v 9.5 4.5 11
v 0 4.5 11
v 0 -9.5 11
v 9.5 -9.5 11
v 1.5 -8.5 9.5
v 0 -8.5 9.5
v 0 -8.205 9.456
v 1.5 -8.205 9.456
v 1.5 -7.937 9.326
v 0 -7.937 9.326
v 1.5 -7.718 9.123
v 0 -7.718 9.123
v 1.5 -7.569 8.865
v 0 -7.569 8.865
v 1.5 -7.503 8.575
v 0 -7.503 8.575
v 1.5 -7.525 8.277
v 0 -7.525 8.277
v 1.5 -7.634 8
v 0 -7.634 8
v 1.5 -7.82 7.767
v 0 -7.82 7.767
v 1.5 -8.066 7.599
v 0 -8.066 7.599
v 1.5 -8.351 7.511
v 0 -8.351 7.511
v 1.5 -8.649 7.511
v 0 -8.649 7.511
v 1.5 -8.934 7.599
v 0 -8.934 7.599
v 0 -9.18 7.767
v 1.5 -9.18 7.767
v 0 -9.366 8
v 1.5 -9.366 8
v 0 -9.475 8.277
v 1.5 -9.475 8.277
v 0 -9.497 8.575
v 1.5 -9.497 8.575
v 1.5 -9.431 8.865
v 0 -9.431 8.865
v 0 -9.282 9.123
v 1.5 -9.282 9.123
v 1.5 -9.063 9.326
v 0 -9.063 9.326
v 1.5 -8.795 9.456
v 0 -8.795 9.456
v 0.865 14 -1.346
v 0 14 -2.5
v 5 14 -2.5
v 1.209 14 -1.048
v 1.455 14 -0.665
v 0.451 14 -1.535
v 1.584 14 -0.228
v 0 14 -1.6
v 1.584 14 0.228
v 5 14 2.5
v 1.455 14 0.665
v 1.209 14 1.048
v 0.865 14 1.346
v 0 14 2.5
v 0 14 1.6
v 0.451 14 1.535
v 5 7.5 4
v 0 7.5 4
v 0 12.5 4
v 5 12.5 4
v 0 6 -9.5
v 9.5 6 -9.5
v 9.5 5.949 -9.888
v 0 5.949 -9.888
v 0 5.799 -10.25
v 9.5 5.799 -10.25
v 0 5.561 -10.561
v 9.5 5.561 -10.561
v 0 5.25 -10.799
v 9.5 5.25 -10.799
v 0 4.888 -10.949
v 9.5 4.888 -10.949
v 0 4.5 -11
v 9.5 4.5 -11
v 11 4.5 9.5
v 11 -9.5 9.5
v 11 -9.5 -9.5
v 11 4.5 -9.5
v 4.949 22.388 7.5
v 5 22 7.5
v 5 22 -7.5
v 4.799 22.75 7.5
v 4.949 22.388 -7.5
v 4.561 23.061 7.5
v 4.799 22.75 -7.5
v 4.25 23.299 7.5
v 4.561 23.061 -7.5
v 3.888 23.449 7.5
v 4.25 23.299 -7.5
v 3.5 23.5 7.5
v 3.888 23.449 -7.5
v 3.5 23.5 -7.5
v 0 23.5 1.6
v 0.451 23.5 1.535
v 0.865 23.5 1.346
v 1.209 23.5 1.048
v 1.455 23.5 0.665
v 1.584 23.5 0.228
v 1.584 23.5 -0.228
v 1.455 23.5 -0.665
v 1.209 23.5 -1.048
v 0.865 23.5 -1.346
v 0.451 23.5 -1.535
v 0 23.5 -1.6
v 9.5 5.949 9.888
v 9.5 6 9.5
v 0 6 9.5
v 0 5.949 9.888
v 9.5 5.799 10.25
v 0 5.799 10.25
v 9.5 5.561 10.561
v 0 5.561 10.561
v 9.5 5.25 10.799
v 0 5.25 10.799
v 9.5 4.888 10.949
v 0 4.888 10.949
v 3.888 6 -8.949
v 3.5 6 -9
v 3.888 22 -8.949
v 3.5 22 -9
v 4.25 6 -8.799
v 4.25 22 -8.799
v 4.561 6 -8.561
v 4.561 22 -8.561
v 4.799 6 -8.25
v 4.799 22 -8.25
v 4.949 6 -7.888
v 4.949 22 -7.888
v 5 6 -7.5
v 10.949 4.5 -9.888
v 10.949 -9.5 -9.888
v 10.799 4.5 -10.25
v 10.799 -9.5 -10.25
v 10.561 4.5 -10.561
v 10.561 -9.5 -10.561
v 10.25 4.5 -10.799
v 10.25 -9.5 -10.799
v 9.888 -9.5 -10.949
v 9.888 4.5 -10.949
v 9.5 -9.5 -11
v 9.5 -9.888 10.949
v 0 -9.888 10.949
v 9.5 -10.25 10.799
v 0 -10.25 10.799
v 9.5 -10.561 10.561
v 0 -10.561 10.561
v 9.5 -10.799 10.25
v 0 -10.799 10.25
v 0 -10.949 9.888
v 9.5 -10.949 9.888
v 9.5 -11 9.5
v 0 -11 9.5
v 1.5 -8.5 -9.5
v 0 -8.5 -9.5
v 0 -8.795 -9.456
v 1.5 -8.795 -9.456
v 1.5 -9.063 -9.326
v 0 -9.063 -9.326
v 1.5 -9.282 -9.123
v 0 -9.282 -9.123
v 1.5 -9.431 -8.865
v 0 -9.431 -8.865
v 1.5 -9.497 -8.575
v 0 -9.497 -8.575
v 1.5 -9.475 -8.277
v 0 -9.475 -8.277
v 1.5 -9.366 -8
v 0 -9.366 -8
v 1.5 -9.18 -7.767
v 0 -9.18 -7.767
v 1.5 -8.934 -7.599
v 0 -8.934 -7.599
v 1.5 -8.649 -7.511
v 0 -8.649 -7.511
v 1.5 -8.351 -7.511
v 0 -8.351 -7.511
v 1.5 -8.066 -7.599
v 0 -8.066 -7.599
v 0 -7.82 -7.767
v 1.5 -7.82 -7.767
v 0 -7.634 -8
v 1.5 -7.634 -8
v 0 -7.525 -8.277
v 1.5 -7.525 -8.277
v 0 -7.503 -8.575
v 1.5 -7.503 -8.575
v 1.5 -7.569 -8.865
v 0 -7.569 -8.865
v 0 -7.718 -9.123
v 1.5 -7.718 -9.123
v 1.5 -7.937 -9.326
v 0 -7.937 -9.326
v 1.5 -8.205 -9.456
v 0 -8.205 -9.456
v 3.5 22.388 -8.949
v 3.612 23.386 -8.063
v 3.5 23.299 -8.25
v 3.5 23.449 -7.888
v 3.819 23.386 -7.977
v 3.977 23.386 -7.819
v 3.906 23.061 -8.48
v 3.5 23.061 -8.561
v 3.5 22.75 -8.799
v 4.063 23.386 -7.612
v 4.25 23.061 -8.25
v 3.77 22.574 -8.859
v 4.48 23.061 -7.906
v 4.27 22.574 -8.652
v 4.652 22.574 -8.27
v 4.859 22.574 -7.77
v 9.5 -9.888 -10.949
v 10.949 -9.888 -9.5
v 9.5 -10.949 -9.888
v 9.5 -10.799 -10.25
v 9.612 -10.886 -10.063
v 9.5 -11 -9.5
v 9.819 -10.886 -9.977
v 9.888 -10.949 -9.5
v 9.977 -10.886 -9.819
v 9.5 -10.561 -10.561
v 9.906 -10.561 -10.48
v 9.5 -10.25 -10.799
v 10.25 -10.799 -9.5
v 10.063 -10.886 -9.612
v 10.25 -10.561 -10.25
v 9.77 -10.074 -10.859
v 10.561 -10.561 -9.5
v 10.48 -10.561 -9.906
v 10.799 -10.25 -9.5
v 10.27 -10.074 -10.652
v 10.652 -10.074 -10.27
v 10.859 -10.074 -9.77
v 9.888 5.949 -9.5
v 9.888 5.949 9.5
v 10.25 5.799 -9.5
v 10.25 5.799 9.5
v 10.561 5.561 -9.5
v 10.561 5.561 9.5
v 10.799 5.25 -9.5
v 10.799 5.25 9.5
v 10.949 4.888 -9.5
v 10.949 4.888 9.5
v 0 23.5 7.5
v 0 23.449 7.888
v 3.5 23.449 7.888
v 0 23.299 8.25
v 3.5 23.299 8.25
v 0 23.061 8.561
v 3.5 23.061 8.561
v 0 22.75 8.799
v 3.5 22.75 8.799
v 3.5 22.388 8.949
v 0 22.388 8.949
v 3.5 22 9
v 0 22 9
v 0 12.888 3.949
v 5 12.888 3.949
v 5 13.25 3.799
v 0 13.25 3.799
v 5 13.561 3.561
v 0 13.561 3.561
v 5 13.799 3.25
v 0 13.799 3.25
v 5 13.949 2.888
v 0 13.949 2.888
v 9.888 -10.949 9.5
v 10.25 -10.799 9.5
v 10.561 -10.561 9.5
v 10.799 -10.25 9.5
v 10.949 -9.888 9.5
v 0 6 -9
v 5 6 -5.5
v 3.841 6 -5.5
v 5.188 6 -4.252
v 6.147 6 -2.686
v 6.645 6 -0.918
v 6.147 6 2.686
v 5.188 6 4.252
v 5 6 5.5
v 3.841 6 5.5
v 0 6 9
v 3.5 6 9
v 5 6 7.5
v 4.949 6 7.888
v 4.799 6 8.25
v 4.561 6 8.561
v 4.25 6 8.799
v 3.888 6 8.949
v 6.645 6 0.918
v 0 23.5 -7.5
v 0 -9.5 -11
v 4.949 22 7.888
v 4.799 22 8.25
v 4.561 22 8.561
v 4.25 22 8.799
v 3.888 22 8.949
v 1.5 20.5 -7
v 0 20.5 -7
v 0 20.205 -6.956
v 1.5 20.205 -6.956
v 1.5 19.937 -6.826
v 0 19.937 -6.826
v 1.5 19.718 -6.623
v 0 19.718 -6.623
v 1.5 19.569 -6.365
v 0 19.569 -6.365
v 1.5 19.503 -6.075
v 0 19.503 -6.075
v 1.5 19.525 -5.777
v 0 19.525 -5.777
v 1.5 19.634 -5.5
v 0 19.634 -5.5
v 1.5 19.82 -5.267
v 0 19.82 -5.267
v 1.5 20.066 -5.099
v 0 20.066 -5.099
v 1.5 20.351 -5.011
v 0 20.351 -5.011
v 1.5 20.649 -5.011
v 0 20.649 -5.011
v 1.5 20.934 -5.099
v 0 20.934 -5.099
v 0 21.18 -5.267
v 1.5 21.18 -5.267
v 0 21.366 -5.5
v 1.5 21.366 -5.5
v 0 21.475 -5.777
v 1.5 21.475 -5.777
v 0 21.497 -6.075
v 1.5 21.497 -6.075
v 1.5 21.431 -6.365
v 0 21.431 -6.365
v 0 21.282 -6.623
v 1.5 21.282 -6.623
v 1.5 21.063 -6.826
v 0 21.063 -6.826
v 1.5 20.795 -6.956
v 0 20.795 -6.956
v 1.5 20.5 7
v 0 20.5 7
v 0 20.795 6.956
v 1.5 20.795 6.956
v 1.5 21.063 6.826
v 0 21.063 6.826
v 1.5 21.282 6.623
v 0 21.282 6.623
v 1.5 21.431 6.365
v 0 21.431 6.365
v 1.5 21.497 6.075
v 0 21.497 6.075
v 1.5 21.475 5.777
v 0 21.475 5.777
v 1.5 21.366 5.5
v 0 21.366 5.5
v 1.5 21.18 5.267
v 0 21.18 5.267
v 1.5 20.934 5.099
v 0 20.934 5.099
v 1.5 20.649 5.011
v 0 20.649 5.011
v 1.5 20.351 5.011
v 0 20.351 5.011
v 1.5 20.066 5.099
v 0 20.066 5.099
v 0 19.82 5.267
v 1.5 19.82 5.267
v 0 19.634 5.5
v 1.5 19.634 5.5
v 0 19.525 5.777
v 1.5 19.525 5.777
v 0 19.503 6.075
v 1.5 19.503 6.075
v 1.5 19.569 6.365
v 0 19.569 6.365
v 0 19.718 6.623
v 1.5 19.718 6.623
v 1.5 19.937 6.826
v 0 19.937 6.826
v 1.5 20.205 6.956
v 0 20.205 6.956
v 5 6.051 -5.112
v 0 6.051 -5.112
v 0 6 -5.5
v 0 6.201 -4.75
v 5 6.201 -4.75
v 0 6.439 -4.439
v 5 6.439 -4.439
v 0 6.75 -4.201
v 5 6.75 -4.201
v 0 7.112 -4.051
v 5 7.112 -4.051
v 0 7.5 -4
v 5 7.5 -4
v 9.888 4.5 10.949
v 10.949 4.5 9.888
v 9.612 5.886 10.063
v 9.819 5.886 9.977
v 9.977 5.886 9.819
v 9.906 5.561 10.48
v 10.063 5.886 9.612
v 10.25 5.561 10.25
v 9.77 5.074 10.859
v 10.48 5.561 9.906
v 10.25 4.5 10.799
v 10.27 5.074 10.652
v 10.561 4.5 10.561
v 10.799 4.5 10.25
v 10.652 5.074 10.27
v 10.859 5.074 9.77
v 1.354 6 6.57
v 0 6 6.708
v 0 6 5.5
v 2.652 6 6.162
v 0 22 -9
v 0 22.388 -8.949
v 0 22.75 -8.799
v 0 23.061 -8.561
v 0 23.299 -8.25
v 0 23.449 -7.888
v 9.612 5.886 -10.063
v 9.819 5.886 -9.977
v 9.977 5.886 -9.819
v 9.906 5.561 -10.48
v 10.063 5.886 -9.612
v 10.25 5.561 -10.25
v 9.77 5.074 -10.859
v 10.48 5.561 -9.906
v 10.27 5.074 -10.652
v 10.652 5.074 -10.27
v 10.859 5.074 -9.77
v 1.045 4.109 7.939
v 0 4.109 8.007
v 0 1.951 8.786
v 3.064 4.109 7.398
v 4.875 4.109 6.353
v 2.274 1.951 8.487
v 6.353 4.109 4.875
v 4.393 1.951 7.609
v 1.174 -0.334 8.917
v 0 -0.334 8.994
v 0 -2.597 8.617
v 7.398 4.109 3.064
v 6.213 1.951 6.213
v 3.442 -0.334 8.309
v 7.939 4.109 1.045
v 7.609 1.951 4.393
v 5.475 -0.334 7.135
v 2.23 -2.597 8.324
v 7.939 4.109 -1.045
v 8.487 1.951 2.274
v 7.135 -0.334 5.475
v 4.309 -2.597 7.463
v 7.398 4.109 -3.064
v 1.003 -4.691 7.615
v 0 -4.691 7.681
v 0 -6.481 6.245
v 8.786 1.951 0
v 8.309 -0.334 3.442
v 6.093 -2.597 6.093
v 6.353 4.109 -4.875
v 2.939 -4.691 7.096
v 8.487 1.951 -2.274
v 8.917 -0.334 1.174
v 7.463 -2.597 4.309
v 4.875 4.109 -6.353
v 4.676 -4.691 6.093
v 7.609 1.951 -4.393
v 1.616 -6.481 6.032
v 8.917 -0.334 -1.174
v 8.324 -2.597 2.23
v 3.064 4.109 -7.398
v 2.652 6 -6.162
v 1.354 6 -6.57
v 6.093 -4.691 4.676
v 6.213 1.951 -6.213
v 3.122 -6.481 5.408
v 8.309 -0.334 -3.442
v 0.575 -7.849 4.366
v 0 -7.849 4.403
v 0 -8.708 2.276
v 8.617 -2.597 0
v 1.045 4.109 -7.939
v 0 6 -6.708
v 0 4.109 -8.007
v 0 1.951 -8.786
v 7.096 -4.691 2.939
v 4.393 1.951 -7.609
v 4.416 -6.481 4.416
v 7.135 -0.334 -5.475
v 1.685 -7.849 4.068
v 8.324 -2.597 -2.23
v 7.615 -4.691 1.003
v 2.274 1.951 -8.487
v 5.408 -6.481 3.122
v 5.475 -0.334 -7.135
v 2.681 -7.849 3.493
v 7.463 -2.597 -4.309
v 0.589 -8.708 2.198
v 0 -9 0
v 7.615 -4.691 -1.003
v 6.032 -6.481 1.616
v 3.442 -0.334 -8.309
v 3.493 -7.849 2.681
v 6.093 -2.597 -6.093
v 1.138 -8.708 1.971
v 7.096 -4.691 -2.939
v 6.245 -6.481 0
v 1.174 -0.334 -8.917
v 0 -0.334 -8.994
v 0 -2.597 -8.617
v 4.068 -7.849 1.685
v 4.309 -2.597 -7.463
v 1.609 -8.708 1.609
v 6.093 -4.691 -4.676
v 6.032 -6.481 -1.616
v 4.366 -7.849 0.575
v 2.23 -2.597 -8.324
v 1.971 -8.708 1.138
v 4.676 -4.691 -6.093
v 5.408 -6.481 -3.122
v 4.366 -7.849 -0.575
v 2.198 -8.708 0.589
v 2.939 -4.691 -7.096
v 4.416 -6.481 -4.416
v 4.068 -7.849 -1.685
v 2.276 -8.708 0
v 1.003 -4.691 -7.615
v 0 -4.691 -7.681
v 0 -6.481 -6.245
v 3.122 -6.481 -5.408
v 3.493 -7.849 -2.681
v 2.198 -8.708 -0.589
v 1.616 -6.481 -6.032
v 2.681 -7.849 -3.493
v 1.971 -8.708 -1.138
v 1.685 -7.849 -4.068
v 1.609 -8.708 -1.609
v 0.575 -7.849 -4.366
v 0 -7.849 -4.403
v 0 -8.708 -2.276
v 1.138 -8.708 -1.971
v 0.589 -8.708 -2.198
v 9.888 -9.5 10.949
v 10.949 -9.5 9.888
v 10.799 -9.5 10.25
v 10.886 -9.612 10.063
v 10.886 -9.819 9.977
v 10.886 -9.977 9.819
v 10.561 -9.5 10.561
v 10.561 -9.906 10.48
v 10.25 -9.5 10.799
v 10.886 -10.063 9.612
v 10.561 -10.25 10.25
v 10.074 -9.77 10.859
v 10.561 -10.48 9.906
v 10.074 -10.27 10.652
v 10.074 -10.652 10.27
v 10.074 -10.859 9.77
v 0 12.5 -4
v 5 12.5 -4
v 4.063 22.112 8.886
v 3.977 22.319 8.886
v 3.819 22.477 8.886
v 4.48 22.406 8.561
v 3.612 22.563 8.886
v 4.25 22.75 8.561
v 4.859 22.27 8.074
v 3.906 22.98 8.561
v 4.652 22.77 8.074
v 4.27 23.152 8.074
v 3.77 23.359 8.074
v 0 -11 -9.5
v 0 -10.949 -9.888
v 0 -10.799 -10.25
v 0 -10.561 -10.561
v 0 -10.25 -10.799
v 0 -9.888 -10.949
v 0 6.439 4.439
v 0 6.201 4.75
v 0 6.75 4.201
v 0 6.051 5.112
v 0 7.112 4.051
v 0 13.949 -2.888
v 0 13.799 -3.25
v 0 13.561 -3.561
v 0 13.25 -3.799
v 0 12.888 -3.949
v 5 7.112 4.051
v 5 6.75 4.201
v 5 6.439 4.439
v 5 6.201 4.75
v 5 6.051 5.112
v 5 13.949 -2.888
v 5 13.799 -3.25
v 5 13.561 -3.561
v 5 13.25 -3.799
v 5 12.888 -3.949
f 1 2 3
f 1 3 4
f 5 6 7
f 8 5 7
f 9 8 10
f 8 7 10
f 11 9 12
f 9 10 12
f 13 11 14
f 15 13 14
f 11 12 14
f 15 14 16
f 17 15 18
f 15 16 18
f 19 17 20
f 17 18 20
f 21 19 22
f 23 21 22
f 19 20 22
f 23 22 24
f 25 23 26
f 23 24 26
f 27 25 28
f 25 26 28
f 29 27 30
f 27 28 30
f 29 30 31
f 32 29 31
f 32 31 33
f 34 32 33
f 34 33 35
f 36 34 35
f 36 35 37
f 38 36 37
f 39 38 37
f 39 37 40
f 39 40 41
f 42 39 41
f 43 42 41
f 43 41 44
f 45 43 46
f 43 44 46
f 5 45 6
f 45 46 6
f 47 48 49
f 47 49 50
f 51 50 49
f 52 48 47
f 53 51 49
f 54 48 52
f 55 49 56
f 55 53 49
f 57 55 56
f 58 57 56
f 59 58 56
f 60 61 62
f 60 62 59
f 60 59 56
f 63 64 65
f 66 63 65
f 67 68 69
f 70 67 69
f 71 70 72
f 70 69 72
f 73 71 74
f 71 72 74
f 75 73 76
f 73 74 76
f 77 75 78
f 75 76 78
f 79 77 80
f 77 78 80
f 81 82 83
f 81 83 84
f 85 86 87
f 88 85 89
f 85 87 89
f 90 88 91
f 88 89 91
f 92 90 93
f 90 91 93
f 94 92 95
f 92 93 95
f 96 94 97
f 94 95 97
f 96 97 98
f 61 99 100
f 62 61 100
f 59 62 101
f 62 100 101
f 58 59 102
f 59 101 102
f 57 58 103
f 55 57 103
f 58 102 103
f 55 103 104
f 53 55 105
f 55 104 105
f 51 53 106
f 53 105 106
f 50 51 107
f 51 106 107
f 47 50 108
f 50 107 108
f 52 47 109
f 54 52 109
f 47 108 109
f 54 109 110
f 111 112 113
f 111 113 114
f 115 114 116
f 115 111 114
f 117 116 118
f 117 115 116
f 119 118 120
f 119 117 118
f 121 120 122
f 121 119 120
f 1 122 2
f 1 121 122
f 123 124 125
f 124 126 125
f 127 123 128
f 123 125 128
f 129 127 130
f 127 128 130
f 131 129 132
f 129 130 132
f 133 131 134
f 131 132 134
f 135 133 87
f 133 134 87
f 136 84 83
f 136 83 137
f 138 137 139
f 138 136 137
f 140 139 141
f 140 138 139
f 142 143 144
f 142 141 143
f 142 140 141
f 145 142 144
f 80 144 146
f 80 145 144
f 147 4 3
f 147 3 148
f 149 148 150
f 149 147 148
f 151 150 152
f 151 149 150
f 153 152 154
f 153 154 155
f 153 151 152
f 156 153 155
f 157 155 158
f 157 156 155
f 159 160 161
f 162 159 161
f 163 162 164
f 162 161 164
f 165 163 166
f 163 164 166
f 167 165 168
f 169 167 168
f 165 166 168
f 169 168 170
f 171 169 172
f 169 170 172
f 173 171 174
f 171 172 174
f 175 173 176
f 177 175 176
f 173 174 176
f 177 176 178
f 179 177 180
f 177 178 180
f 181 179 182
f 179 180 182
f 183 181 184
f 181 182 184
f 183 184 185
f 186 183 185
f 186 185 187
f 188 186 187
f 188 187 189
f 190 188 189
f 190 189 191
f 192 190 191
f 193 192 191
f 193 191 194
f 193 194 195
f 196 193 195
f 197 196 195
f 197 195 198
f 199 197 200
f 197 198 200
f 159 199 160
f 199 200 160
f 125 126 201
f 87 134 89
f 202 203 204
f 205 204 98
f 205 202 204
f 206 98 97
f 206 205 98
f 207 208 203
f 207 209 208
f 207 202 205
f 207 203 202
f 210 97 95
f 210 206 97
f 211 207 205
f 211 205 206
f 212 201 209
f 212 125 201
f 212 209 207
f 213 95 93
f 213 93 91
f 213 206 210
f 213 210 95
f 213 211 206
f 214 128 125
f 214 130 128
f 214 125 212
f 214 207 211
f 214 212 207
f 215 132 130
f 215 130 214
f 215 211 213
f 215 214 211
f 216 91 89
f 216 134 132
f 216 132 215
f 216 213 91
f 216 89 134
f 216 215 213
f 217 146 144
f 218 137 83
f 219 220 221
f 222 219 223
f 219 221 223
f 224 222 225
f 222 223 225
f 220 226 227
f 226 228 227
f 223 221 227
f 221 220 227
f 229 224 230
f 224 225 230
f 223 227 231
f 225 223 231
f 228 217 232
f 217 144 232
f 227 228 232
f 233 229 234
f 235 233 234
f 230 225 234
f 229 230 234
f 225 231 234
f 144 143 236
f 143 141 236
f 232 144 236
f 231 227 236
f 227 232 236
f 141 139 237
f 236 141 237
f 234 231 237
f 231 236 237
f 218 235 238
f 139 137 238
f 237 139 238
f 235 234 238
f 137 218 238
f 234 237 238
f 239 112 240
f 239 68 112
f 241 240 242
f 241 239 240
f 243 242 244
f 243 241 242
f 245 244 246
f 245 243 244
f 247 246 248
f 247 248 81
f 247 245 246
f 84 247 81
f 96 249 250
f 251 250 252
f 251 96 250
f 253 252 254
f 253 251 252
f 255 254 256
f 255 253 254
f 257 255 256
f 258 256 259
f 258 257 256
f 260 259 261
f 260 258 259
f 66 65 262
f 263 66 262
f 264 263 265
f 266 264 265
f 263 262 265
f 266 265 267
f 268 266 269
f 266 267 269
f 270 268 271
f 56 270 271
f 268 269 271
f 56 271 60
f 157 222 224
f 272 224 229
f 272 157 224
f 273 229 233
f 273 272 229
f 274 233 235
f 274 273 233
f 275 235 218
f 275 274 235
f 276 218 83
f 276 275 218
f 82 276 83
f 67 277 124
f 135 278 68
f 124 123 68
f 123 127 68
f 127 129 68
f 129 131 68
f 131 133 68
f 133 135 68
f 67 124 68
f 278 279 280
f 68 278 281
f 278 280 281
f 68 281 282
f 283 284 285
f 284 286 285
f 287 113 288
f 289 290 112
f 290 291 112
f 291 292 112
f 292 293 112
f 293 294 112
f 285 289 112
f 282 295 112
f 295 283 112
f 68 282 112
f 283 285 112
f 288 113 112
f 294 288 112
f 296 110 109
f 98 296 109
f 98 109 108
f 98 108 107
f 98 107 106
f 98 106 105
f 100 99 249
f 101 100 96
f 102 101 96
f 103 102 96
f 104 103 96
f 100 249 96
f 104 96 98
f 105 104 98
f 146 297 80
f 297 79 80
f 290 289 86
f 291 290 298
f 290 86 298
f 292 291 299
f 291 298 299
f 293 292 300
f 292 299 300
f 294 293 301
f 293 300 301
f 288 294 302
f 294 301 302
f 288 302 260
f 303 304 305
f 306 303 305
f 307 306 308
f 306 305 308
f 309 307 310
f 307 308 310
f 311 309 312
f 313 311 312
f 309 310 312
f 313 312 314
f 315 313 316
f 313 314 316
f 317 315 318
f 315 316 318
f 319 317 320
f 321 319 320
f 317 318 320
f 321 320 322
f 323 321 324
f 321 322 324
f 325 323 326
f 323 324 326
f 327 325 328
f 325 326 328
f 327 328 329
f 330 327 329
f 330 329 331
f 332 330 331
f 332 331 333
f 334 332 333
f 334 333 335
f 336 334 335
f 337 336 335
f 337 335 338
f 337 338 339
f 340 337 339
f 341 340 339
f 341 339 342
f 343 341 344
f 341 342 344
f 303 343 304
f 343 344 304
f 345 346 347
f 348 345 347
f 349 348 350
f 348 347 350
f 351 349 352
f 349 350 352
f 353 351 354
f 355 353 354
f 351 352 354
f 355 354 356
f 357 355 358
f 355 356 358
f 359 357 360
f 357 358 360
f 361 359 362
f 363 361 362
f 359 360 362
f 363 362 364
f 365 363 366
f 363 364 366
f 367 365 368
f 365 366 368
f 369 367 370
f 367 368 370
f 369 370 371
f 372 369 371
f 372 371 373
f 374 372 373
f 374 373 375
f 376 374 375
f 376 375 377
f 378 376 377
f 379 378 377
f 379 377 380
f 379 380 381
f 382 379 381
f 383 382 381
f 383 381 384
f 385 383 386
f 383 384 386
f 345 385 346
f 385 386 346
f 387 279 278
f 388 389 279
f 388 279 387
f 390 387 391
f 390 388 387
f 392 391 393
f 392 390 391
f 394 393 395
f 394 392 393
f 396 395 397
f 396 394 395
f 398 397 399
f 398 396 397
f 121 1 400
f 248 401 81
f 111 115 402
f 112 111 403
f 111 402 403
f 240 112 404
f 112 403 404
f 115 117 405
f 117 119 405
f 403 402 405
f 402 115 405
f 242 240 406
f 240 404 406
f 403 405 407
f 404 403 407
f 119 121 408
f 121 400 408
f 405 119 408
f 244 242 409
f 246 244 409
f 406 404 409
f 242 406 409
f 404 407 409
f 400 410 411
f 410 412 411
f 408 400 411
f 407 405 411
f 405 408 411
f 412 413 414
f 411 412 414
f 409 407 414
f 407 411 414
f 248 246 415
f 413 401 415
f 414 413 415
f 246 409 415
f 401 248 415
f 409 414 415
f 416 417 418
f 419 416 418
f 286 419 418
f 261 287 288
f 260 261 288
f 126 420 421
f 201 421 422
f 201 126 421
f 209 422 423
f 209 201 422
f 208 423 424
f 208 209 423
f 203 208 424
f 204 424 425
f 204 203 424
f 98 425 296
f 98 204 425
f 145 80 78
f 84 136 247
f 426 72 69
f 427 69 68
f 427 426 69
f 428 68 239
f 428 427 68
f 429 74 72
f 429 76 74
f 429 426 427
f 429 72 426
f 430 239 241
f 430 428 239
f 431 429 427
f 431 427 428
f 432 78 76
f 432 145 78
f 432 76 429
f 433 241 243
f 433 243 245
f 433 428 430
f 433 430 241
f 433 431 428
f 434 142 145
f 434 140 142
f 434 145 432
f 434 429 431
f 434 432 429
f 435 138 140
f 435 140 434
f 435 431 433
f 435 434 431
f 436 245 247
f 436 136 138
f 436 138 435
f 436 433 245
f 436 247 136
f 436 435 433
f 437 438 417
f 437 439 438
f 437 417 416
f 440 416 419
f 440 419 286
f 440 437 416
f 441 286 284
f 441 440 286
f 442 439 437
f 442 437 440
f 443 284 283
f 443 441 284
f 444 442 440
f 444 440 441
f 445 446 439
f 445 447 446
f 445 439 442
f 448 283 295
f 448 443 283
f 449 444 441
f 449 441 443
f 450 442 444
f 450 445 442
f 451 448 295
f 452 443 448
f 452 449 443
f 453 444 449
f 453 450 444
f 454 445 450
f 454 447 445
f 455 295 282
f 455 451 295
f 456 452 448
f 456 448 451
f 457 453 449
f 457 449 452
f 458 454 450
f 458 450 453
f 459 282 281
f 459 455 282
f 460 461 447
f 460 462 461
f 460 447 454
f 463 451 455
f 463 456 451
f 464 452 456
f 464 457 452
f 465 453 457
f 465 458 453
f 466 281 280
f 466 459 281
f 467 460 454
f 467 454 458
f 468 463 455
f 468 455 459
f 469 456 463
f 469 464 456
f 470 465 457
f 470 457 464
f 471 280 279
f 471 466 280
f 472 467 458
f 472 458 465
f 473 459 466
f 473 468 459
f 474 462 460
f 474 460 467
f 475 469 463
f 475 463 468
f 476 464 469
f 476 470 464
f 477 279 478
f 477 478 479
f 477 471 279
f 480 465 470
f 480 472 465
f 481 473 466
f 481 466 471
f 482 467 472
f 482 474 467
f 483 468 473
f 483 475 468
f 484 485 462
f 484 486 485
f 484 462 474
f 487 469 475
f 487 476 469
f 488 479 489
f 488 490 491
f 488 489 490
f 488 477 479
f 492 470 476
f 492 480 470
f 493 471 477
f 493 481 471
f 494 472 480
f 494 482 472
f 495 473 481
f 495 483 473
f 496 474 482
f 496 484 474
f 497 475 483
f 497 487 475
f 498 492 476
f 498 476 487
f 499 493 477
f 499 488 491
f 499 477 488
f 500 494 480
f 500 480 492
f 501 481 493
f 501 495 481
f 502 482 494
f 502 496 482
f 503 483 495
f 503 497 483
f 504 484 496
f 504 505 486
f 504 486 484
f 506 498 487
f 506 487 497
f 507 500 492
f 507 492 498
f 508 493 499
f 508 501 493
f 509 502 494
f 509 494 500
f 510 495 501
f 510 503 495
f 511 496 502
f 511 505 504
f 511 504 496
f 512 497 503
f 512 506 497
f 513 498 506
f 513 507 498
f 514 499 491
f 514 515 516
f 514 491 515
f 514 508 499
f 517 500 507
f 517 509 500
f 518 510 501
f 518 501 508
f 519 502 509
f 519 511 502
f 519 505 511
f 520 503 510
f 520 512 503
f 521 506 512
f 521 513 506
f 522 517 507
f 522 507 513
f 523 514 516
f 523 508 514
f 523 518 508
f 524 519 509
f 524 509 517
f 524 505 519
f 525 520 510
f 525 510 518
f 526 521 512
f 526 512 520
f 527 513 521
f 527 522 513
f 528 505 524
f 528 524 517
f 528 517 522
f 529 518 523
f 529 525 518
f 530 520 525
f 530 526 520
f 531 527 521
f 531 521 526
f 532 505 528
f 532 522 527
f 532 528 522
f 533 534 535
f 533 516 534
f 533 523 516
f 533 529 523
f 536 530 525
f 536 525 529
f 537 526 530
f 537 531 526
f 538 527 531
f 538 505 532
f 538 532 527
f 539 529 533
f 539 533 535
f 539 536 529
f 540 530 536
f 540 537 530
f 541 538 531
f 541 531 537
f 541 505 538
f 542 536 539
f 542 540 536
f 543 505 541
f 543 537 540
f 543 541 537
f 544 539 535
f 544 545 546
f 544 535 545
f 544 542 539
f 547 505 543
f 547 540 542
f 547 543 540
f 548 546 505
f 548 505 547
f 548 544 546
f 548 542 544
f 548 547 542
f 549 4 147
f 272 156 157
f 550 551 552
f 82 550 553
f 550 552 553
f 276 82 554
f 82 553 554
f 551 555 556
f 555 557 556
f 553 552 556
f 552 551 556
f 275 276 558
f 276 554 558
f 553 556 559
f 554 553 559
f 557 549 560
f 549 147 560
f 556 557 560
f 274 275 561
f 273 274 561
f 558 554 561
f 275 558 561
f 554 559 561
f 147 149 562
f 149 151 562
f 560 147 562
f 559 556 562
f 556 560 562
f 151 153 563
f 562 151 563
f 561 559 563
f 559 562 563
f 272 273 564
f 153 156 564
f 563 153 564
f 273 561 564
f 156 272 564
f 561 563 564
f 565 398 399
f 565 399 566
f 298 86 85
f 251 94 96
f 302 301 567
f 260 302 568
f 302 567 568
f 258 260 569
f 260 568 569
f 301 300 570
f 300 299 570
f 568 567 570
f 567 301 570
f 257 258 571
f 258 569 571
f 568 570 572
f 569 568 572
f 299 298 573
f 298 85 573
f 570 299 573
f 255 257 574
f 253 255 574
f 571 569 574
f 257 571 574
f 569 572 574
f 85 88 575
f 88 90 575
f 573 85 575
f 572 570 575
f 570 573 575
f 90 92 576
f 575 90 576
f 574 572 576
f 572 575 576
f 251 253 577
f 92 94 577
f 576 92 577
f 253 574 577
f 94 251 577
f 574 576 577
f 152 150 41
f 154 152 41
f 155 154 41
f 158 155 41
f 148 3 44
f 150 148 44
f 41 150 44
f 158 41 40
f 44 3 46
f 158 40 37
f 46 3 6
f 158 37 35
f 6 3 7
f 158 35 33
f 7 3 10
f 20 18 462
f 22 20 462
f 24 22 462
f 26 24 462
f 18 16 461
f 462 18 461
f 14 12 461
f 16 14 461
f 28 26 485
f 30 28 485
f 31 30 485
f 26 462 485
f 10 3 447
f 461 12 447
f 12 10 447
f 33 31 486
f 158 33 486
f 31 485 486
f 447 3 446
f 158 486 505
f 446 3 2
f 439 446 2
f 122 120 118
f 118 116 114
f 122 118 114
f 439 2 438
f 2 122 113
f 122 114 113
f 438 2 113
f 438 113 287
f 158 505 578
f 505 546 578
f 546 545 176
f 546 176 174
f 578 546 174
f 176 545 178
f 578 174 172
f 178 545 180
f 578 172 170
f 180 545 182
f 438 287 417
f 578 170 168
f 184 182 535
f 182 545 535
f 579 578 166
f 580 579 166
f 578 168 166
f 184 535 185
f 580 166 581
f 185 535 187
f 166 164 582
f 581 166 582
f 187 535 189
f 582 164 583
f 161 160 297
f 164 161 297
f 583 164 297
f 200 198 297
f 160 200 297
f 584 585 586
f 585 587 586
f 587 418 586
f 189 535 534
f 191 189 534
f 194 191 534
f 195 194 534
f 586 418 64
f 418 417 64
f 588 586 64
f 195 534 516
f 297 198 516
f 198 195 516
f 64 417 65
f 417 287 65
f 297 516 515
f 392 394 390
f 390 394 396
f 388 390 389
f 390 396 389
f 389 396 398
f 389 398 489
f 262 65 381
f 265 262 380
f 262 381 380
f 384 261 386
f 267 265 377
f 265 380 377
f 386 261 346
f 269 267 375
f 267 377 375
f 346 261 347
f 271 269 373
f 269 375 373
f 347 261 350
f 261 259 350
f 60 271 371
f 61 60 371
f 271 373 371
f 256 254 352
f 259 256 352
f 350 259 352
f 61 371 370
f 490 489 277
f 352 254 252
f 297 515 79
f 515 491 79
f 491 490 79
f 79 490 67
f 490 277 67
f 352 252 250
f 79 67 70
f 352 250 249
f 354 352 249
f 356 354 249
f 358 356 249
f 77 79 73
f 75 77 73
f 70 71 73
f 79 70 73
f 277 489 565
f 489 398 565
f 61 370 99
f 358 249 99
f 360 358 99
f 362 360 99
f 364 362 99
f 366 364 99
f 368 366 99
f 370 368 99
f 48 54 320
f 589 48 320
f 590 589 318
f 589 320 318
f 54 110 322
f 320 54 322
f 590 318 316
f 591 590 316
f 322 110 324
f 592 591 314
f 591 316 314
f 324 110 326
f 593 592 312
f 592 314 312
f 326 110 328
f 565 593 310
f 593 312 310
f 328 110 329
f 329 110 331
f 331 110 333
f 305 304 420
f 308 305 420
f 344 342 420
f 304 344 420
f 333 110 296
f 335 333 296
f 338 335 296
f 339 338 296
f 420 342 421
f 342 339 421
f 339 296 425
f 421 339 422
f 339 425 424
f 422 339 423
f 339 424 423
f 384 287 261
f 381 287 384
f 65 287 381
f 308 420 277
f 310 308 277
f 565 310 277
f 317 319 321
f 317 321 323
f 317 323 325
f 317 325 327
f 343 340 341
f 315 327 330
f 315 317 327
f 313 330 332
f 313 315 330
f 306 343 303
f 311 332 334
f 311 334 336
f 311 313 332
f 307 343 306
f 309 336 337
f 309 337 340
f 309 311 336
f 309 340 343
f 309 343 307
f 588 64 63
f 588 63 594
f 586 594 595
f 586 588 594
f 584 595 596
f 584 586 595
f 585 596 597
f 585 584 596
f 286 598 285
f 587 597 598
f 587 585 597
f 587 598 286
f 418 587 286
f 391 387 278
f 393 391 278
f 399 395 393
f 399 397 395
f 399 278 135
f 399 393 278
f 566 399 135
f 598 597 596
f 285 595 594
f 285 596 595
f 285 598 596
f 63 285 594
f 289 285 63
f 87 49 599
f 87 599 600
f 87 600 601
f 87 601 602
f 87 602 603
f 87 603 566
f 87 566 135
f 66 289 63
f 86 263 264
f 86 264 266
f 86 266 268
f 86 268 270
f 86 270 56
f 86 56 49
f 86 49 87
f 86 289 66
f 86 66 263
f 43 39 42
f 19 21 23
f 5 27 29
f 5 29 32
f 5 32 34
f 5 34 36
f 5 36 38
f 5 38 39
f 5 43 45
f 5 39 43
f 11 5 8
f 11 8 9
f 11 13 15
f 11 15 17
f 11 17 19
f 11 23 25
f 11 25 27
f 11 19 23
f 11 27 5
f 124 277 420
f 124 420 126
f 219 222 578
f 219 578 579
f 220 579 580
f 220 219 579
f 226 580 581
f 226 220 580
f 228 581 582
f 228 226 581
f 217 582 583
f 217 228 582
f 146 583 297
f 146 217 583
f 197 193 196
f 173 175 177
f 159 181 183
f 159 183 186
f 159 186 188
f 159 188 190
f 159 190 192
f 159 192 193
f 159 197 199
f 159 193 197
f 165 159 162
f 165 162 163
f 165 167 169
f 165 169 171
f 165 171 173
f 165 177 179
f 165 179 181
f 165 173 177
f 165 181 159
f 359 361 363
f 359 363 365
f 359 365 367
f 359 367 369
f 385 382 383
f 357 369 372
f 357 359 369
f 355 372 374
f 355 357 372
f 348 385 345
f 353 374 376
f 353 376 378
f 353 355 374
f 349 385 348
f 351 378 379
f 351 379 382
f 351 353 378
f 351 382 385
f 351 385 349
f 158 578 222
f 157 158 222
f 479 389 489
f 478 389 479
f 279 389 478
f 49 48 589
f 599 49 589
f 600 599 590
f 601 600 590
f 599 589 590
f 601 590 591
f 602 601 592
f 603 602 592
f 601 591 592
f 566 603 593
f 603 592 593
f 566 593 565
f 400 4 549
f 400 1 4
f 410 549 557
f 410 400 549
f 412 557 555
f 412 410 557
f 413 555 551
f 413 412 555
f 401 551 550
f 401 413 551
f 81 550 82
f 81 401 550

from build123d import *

# Parameters (mm, degrees)
SKETCH_1_W          = 22
SKETCH_1_H          = 17
EXTRUDE_1_DEPTH     = 11
SKETCH_3_W          = 10
SKETCH_3_H          = 17.5
EXTRUDE_2_DEPTH     = 9
SKETCH_4_R          = 1.6
CUT_EXTRUDE_1_DEPTH = 22
SKETCH_5_W          = 8
SKETCH_5_H          = 8
CUT_EXTRUDE_2_DEPTH = 22
FILLET_1_R          = 1.5
FILLET_START        = -6
FILLET_2_DEPTH      = 11
FILLET_START_2      = -5
FILLET_2_2_DEPTH    = 10
SKETCH_7_W          = 37.569031752
SKETCH_7_H          = 53.082934042
CUT_EXTRUDE_4_DEPTH = 22
SKETCH_8_R          = 1
CUT_EXTRUDE_5_DEPTH = 1.5


with BuildPart() as part:
    # 草图1 → 凸台-拉伸1 (new, symmetric)
    with BuildSketch(Plane.XY):
        with Locations((0, -2.5)):
            Rectangle(SKETCH_1_W, SKETCH_1_H)
    extrude(amount=EXTRUDE_1_DEPTH, both=True)

    # 草图2 → 切除-旋转1 (revolve, cut)
    with BuildSketch(Plane.XY, mode=Mode.PRIVATE) as cut_revolve_1_sk:
        with BuildLine():
            Line((0, 6), (6.708203932, 6))
            ThreePointArc((6.708203932, 6), (8.215838363, -3.674234614), (0, -9))
            Line((0, -9), (0, 6))
        make_face()
    revolve(cut_revolve_1_sk.sketch.rotate(Axis((0, 0, 0), (0, 1, 0)), 180), axis=Axis((0, 0, 0), (0, 1, 0)), mode=Mode.SUBTRACT)

    # 草图3 → 凸台-拉伸2 (add, symmetric)
    with BuildSketch(Plane.XY):
        with Locations((0, 14.75)):
            Rectangle(SKETCH_3_W, SKETCH_3_H)
    extrude(amount=EXTRUDE_2_DEPTH, both=True)

    # 草图4 → 切除-拉伸1 (cut)
    with BuildSketch(Plane(origin=(0, 23.5, 0), x_dir=(1, 0, 0), z_dir=(0, 1, 0))):
        with Locations(Location((0, 0, 0), (0, 0, 180))):
            Circle(SKETCH_4_R)
    extrude(amount=-CUT_EXTRUDE_1_DEPTH, mode=Mode.SUBTRACT)

    # 草图5 → 切除-拉伸2 (cut)
    with BuildSketch(Plane.ZY.offset(5)):
        with Locations((0, 10)):
            Rectangle(SKETCH_5_W, SKETCH_5_H)
    extrude(amount=-CUT_EXTRUDE_2_DEPTH, mode=Mode.SUBTRACT)

    # 圆角1
    fillet_1_edges = [part.edges().sort_by_distance(p)[0] for p in [
        (0, -11, 11),
        (11, -2.5, 11),
        (5, 14.75, -9),
        (0, 23.5, -9),
        (5, 23.5, 0),
        (-5, 14.75, -9),
        (-5, 23.5, 0),
        (5, 14.75, 9),
        (0, 23.5, 9),
        (-5, 14.75, 9),
        (0, 6, 11),
        (11, -2.5, -11),
        (0, -11, -11),
        (-11, -2.5, -11),
        (0, 6, -11),
        (11, 6, 0),
        (11, -11, 0),
        (-11, -11, 0),
        (-11, 6, 0),
        (-11, -2.5, 11),
    ]]
    fillet(fillet_1_edges, radius=FILLET_1_R)

    # 圆角2: read off the stored shape, not the designer's step
    # 圆角2 outline → 圆角2 (cut)
    with BuildSketch(Plane.YZ.offset(FILLET_START)):
        with BuildLine():
            Line((6, -4), (6, -5.5))
            ThreePointArc((6, -5.5), (6.439339828, -4.439339828), (7.5, -4))
            Line((7.5, -4), (6, -4))
        make_face()
        with BuildLine():
            Line((6, 4), (7.5, 4))
            ThreePointArc((7.5, 4), (6.439339828, 4.439339828), (6, 5.5))
            Line((6, 5.5), (6, 4))
        make_face()
    extrude(amount=FILLET_2_DEPTH, mode=Mode.SUBTRACT)

    # Fillet 2 2 outline → Fillet 2 2 (add)
    with BuildSketch(Plane.YZ.offset(FILLET_START_2)):
        with BuildLine():
            ThreePointArc((12.5, 4), (13.560660172, 3.560660172), (14, 2.5))
            Line((14, 2.5), (14, 4))
            Line((14, 4), (12.5, 4))
        make_face()
        with BuildLine():
            ThreePointArc((14, -2.5), (13.560660172, -3.560660172), (12.5, -4))
            Line((12.5, -4), (14, -4))
            Line((14, -4), (14, -2.5))
        make_face()
    extrude(amount=FILLET_2_2_DEPTH)

    # 草图7 → 切除-拉伸4 (cut)
    with BuildSketch(Plane(origin=(0, 0, 0), x_dir=(0, 0, -1), z_dir=(1, 0, 0))):
        Rectangle(SKETCH_7_W, SKETCH_7_H)
    extrude(amount=-CUT_EXTRUDE_4_DEPTH, mode=Mode.SUBTRACT)

    # 草图8 → 切除-拉伸5 (cut)
    with BuildSketch(Plane.ZY):
        with Locations((6, 20.5)):
            Circle(SKETCH_8_R)
        with Locations((8.5, -8.5)):
            Circle(SKETCH_8_R)
        with Locations(Location((-6, 20.5, 0), (0, 0, 180))):
            Circle(SKETCH_8_R)
        with Locations(Location((-8.5, -8.5, 0), (0, 0, 180))):
            Circle(SKETCH_8_R)
    extrude(amount=-CUT_EXTRUDE_5_DEPTH, mode=Mode.SUBTRACT)


solid = part.part
